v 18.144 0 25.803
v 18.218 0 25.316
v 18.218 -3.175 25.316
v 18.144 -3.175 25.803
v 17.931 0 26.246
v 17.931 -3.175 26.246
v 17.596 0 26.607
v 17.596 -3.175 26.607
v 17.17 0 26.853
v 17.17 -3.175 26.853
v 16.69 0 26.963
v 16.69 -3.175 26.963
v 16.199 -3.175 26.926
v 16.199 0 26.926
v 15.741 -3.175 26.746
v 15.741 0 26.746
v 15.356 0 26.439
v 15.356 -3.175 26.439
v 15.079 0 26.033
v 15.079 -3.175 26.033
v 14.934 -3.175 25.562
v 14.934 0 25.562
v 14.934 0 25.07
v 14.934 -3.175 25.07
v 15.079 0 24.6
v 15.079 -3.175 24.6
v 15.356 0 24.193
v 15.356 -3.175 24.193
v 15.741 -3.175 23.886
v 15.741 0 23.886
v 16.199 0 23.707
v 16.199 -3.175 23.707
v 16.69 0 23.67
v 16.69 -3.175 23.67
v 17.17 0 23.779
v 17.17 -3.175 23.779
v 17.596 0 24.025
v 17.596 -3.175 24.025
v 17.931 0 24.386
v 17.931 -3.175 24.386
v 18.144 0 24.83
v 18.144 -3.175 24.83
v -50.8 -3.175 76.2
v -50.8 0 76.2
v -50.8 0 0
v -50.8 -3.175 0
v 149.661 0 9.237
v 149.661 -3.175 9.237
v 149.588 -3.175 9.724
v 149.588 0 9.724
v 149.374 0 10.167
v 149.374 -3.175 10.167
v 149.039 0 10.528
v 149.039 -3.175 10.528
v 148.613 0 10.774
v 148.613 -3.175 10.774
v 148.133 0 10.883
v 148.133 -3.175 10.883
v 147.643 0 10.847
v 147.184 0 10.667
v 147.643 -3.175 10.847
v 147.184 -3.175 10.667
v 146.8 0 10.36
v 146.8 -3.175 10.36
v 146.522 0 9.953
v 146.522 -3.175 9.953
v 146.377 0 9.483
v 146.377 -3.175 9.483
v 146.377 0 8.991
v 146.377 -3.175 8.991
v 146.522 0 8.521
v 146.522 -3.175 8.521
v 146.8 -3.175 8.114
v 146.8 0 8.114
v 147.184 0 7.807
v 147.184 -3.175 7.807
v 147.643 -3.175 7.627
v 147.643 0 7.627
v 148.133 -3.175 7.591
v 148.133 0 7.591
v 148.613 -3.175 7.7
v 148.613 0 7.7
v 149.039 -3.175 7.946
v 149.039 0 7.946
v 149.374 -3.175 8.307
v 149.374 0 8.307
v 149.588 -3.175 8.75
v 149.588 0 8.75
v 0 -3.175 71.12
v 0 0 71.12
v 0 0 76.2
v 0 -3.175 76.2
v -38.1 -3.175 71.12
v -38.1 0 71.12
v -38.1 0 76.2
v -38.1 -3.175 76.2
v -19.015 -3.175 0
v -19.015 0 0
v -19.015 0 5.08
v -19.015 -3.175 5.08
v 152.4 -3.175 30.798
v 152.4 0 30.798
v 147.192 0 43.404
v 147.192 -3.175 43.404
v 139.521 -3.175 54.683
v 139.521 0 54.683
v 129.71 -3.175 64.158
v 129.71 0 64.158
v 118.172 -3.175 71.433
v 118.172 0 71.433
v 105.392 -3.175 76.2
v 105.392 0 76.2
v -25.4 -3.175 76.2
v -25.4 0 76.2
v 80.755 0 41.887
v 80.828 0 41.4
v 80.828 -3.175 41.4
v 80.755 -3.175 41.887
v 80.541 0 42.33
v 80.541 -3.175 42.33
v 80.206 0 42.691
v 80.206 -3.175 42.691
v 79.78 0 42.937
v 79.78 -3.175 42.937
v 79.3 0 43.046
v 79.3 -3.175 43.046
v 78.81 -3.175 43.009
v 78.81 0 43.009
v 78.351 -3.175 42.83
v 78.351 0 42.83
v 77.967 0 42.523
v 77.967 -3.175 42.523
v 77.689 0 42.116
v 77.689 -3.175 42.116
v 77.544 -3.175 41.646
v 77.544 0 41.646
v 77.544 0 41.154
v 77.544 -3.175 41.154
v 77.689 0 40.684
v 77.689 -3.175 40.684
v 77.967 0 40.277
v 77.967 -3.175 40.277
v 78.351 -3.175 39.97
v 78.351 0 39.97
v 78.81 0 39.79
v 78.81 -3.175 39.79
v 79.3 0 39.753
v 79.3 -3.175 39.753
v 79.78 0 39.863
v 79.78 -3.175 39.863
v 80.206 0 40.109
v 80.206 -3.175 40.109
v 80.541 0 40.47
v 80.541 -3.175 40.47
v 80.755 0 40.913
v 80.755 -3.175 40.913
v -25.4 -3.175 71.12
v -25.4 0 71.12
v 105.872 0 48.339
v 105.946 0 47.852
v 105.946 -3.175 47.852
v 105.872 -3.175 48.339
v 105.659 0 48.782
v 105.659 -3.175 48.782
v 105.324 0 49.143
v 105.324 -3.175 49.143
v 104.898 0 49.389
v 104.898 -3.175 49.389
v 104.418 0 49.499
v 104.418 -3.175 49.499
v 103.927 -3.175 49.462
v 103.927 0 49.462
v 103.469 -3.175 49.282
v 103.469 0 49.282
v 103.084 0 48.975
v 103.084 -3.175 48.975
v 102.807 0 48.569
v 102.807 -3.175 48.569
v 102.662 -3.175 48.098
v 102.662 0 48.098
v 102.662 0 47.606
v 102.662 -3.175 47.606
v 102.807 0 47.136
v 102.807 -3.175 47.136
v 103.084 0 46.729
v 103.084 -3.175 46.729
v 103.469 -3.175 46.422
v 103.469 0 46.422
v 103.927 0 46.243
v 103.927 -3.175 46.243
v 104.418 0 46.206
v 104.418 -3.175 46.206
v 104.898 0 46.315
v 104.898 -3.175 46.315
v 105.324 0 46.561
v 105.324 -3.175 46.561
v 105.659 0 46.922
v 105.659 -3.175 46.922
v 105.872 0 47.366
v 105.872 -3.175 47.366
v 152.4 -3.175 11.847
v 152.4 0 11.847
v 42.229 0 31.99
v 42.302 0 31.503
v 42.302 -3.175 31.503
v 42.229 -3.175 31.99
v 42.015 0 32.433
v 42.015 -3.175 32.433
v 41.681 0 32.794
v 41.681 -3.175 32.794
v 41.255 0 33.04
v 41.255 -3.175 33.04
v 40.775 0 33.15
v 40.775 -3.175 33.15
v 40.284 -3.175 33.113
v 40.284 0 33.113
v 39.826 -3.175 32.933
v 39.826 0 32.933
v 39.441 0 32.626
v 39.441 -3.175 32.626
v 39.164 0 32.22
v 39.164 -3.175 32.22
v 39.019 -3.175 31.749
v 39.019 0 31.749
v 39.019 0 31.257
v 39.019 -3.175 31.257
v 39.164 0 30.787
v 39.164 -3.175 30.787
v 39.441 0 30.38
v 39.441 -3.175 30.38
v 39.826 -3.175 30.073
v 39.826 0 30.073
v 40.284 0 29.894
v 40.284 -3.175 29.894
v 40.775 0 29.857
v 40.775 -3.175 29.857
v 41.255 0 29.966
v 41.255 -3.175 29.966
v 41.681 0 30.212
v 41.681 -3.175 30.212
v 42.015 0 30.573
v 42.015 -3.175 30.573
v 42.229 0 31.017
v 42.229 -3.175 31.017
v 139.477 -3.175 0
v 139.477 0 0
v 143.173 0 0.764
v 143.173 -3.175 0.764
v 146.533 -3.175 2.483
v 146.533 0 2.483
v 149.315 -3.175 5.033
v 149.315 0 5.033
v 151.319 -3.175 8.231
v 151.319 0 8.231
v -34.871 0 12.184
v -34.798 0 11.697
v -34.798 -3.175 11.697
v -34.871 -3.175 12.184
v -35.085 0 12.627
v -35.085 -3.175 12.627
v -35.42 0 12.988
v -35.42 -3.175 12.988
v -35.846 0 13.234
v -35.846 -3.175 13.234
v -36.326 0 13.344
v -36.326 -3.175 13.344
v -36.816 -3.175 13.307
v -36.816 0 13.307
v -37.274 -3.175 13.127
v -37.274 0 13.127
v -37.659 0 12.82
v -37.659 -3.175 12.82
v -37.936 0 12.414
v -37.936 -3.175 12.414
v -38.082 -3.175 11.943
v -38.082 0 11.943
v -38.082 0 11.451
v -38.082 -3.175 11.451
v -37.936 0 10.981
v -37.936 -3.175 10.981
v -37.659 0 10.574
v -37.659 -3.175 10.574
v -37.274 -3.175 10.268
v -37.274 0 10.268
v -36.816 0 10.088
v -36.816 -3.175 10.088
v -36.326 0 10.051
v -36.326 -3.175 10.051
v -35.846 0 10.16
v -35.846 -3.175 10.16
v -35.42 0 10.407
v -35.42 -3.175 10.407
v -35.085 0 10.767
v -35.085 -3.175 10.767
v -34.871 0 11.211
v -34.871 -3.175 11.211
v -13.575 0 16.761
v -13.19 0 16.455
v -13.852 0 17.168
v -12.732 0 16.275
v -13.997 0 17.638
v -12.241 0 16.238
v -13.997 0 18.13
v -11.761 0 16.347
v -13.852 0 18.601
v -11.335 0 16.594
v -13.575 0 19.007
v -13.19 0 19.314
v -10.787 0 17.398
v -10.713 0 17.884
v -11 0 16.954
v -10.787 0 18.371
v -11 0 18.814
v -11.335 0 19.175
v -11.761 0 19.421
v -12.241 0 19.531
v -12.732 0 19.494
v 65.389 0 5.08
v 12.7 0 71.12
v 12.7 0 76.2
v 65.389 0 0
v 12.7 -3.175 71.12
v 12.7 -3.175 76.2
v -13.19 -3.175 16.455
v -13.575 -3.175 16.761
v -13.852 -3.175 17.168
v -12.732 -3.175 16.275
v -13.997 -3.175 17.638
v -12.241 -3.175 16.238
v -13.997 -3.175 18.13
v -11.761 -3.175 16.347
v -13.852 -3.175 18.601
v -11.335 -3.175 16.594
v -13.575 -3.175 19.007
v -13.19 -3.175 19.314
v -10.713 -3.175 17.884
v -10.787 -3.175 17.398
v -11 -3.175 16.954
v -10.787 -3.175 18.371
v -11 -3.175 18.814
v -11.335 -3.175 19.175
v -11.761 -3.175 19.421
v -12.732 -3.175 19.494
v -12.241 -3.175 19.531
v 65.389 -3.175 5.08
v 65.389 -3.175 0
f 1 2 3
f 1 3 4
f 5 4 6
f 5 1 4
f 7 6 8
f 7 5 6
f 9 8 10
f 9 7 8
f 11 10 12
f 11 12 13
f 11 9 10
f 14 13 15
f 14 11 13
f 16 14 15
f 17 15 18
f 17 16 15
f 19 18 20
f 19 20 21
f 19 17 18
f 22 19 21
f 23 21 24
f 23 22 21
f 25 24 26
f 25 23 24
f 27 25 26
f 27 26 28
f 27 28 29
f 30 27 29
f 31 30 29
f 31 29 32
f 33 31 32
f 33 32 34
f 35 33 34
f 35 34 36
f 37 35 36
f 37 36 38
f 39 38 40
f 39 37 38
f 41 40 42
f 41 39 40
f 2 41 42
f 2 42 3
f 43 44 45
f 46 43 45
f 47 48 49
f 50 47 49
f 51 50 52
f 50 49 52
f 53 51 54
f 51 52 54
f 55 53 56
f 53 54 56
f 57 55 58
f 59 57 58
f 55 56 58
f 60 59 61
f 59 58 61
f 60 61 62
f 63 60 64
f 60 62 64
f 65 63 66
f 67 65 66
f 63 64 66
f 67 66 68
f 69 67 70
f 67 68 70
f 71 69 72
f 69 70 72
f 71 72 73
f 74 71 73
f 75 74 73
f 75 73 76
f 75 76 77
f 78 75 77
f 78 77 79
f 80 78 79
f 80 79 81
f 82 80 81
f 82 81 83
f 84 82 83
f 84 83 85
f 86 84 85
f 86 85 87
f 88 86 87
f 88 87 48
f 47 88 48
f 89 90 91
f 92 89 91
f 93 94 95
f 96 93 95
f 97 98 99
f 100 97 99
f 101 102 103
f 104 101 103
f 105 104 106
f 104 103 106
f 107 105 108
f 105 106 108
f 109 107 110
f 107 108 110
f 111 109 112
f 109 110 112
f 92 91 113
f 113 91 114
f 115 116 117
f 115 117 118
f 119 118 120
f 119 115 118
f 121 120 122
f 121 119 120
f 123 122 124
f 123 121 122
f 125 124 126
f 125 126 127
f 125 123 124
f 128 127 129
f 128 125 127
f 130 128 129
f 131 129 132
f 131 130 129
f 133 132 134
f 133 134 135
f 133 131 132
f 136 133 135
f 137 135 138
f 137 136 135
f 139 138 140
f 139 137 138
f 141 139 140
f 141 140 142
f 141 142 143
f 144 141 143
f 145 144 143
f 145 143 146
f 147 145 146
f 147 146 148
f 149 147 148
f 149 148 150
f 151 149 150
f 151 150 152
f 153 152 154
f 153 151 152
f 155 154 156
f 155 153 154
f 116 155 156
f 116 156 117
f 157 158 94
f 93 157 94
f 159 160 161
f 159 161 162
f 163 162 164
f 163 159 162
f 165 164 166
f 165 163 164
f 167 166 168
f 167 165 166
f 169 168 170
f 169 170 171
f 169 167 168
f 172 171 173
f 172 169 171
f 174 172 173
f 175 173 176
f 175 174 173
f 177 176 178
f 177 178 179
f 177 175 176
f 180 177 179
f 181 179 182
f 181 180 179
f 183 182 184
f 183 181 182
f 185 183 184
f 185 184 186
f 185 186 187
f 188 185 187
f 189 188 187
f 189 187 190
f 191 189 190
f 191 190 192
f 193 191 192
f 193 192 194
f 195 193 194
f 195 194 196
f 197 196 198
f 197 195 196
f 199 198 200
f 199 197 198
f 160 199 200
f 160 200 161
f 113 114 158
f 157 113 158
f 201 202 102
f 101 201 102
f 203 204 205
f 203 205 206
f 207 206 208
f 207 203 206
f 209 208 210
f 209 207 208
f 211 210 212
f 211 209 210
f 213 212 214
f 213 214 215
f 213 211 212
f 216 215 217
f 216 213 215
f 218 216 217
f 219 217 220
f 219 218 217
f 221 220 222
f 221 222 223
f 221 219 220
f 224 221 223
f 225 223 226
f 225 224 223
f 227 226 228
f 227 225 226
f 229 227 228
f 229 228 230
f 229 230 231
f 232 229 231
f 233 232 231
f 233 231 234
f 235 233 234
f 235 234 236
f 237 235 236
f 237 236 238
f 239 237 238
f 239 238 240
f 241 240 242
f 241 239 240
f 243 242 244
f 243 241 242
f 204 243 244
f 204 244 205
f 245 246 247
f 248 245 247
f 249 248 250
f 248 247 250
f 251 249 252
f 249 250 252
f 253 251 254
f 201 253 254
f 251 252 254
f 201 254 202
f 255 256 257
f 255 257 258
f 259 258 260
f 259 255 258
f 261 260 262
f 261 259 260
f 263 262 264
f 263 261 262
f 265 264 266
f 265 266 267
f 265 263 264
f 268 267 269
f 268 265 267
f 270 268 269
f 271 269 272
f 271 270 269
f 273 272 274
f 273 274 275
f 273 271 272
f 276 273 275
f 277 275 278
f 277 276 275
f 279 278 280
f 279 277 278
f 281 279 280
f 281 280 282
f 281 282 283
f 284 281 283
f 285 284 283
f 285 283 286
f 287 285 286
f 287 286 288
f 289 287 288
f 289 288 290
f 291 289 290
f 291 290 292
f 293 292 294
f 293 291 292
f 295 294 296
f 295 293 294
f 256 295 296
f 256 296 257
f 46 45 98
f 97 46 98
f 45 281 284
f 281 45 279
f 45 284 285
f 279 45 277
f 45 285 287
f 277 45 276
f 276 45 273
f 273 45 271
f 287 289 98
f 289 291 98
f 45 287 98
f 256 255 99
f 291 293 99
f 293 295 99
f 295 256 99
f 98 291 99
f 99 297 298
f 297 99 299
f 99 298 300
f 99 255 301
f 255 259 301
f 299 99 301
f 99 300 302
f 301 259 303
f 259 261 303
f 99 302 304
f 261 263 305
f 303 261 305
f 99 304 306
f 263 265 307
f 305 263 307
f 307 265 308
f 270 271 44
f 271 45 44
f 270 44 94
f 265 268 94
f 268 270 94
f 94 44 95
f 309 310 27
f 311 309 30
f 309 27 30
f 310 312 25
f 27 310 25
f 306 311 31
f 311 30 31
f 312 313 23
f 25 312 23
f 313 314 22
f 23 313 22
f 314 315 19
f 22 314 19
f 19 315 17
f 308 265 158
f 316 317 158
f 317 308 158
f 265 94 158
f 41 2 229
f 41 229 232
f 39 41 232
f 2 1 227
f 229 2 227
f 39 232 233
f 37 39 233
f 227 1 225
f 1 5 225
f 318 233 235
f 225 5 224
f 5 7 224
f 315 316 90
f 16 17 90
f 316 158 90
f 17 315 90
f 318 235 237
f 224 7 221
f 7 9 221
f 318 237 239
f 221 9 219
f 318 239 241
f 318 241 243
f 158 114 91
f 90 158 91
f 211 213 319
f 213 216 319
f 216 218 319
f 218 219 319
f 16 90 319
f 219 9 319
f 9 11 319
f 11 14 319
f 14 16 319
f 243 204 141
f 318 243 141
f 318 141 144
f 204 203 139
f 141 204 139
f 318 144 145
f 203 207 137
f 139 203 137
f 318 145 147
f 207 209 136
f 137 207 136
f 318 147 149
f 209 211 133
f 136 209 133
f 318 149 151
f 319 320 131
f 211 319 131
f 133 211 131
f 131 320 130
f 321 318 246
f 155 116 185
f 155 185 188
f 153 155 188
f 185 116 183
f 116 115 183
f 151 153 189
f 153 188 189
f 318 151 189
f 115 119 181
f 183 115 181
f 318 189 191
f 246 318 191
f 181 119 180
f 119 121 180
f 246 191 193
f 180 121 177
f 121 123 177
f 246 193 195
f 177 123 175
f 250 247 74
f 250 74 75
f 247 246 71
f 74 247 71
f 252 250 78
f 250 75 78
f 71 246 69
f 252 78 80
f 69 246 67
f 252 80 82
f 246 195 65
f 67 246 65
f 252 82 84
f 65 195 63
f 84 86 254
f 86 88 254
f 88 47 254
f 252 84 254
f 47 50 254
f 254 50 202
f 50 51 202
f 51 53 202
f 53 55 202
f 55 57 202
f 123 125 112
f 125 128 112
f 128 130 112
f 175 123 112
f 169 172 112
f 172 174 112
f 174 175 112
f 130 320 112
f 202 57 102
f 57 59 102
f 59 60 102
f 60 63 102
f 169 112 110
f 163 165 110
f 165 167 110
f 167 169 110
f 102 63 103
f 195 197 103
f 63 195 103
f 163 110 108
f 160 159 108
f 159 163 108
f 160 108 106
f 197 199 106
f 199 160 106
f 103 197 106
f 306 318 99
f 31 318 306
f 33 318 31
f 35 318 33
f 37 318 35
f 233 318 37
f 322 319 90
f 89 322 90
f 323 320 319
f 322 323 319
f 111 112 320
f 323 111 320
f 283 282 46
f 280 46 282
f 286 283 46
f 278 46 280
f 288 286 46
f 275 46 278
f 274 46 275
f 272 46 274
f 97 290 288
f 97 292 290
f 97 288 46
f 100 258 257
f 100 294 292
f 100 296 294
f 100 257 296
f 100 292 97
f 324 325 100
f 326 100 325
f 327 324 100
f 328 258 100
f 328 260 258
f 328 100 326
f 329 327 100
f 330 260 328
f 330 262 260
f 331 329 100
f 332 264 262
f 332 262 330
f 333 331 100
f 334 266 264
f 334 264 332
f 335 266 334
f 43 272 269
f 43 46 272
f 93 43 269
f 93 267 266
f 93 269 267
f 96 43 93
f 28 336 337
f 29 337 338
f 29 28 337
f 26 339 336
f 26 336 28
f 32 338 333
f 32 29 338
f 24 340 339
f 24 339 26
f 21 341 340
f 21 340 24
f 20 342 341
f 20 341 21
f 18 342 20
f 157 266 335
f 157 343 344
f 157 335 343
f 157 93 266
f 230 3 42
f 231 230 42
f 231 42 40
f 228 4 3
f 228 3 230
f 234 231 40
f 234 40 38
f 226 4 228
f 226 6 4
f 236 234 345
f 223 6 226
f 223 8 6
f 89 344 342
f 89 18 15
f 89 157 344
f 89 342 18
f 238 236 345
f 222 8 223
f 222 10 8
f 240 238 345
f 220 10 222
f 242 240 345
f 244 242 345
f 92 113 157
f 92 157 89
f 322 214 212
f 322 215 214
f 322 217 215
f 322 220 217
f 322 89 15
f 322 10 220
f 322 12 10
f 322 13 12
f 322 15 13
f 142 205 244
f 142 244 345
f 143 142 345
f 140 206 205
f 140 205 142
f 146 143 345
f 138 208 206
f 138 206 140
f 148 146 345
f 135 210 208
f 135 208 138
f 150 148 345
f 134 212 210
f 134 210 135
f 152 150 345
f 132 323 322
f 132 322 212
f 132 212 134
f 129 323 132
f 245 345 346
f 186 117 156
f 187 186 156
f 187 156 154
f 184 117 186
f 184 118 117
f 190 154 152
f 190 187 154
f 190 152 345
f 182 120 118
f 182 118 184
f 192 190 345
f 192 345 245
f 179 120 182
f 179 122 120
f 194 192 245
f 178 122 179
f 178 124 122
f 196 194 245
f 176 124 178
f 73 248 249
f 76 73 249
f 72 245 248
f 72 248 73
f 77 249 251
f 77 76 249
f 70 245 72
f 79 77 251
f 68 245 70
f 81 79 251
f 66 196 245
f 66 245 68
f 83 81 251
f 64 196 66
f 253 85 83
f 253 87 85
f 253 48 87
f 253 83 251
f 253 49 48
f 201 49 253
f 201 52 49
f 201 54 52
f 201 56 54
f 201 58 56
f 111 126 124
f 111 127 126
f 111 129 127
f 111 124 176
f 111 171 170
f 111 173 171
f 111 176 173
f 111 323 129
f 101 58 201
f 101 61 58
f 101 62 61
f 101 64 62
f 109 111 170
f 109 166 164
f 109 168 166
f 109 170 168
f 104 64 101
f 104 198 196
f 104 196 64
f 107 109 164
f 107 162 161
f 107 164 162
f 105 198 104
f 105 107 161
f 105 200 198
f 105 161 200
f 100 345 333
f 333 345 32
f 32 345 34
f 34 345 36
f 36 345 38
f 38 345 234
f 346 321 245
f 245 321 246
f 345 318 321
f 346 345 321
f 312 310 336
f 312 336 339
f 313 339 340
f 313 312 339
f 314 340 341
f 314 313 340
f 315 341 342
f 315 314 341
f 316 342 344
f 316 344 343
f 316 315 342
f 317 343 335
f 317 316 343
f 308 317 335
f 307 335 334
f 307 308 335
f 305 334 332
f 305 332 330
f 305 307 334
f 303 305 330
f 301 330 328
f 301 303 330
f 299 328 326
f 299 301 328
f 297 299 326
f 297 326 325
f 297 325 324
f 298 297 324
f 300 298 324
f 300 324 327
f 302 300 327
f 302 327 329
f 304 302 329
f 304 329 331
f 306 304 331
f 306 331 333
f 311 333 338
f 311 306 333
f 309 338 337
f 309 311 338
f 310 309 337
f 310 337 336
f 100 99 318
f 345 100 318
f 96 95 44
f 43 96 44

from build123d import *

# Parameters (mm, degrees)
F0_R     = 1.651
F1_DEPTH = 3.175
F2_R     = 1.651
F3_DEPTH = 25.4


with BuildPart() as f1:
    # F0 (on Front) → F1 (new body)
    with BuildSketch(Plane.XZ):
        with BuildLine():
            Line((65.389104, 5.08), (65.389104, 0))
            Line((65.389104, 0), (111.109104, 0))
            Line((111.109104, 0), (134.019904, 0))
            Line((134.019904, 0), (139.049104, 0))
            Line((139.049104, 0), (139.477193, 0))
            ThreePointArc((139.477193, 0), (148.009982, 3.664074), (152.4, 11.847085))
            Line((152.4, 11.847085), (152.4, 30.797511))
            ThreePointArc((152.4, 30.797511), (134.859224, 59.672781), (105.392106, 76.2))
            Line((105.392106, 76.2), (37.521991, 76.2))
            Line((37.521991, 76.2), (12.7, 76.2))
            Line((12.7, 76.2), (12.7, 71.12))
            Line((12.7, 71.12), (0, 71.12))
            Line((0, 71.12), (0, 76.2))
            Line((0, 76.2), (-25.4, 76.2))
            Line((-25.4, 76.2), (-25.4, 71.12))
            Line((-25.4, 71.12), (-38.1, 71.12))
            Line((-38.1, 71.12), (-38.1, 76.2))
            Line((-38.1, 76.2), (-50.8, 76.2))
            Line((-50.8, 76.2), (-50.8, 0))
            Line((-50.8, 0), (-19.015096, 0))
            Line((-19.015096, 0), (-19.015096, 5.08))
            Line((-19.015096, 5.08), (65.389104, 5.08))
        make_face()
        with Locations((-36.449, 11.697368)):
            Circle(F0_R, mode=Mode.SUBTRACT)
        with Locations((-12.364374, 17.884336)):
            Circle(F0_R, mode=Mode.SUBTRACT)
        with Locations((16.566699, 25.316282)):
            Circle(F0_R, mode=Mode.SUBTRACT)
        with Locations((40.651325, 31.503251)):
            Circle(F0_R, mode=Mode.SUBTRACT)
        with Locations((79.176886, 41.399872)):
            Circle(F0_R, mode=Mode.SUBTRACT)
        with Locations((104.294765, 47.852268)):
            Circle(F0_R, mode=Mode.SUBTRACT)
    extrude(amount=F1_DEPTH)

    # F2 (on face) → F3 (cut)
    with BuildSketch(Plane.XZ.offset(3.175)):
        with Locations((148.009982, 9.237001)):
            Circle(F2_R)
    extrude(amount=-F3_DEPTH, mode=Mode.SUBTRACT)


solid = f1.part
